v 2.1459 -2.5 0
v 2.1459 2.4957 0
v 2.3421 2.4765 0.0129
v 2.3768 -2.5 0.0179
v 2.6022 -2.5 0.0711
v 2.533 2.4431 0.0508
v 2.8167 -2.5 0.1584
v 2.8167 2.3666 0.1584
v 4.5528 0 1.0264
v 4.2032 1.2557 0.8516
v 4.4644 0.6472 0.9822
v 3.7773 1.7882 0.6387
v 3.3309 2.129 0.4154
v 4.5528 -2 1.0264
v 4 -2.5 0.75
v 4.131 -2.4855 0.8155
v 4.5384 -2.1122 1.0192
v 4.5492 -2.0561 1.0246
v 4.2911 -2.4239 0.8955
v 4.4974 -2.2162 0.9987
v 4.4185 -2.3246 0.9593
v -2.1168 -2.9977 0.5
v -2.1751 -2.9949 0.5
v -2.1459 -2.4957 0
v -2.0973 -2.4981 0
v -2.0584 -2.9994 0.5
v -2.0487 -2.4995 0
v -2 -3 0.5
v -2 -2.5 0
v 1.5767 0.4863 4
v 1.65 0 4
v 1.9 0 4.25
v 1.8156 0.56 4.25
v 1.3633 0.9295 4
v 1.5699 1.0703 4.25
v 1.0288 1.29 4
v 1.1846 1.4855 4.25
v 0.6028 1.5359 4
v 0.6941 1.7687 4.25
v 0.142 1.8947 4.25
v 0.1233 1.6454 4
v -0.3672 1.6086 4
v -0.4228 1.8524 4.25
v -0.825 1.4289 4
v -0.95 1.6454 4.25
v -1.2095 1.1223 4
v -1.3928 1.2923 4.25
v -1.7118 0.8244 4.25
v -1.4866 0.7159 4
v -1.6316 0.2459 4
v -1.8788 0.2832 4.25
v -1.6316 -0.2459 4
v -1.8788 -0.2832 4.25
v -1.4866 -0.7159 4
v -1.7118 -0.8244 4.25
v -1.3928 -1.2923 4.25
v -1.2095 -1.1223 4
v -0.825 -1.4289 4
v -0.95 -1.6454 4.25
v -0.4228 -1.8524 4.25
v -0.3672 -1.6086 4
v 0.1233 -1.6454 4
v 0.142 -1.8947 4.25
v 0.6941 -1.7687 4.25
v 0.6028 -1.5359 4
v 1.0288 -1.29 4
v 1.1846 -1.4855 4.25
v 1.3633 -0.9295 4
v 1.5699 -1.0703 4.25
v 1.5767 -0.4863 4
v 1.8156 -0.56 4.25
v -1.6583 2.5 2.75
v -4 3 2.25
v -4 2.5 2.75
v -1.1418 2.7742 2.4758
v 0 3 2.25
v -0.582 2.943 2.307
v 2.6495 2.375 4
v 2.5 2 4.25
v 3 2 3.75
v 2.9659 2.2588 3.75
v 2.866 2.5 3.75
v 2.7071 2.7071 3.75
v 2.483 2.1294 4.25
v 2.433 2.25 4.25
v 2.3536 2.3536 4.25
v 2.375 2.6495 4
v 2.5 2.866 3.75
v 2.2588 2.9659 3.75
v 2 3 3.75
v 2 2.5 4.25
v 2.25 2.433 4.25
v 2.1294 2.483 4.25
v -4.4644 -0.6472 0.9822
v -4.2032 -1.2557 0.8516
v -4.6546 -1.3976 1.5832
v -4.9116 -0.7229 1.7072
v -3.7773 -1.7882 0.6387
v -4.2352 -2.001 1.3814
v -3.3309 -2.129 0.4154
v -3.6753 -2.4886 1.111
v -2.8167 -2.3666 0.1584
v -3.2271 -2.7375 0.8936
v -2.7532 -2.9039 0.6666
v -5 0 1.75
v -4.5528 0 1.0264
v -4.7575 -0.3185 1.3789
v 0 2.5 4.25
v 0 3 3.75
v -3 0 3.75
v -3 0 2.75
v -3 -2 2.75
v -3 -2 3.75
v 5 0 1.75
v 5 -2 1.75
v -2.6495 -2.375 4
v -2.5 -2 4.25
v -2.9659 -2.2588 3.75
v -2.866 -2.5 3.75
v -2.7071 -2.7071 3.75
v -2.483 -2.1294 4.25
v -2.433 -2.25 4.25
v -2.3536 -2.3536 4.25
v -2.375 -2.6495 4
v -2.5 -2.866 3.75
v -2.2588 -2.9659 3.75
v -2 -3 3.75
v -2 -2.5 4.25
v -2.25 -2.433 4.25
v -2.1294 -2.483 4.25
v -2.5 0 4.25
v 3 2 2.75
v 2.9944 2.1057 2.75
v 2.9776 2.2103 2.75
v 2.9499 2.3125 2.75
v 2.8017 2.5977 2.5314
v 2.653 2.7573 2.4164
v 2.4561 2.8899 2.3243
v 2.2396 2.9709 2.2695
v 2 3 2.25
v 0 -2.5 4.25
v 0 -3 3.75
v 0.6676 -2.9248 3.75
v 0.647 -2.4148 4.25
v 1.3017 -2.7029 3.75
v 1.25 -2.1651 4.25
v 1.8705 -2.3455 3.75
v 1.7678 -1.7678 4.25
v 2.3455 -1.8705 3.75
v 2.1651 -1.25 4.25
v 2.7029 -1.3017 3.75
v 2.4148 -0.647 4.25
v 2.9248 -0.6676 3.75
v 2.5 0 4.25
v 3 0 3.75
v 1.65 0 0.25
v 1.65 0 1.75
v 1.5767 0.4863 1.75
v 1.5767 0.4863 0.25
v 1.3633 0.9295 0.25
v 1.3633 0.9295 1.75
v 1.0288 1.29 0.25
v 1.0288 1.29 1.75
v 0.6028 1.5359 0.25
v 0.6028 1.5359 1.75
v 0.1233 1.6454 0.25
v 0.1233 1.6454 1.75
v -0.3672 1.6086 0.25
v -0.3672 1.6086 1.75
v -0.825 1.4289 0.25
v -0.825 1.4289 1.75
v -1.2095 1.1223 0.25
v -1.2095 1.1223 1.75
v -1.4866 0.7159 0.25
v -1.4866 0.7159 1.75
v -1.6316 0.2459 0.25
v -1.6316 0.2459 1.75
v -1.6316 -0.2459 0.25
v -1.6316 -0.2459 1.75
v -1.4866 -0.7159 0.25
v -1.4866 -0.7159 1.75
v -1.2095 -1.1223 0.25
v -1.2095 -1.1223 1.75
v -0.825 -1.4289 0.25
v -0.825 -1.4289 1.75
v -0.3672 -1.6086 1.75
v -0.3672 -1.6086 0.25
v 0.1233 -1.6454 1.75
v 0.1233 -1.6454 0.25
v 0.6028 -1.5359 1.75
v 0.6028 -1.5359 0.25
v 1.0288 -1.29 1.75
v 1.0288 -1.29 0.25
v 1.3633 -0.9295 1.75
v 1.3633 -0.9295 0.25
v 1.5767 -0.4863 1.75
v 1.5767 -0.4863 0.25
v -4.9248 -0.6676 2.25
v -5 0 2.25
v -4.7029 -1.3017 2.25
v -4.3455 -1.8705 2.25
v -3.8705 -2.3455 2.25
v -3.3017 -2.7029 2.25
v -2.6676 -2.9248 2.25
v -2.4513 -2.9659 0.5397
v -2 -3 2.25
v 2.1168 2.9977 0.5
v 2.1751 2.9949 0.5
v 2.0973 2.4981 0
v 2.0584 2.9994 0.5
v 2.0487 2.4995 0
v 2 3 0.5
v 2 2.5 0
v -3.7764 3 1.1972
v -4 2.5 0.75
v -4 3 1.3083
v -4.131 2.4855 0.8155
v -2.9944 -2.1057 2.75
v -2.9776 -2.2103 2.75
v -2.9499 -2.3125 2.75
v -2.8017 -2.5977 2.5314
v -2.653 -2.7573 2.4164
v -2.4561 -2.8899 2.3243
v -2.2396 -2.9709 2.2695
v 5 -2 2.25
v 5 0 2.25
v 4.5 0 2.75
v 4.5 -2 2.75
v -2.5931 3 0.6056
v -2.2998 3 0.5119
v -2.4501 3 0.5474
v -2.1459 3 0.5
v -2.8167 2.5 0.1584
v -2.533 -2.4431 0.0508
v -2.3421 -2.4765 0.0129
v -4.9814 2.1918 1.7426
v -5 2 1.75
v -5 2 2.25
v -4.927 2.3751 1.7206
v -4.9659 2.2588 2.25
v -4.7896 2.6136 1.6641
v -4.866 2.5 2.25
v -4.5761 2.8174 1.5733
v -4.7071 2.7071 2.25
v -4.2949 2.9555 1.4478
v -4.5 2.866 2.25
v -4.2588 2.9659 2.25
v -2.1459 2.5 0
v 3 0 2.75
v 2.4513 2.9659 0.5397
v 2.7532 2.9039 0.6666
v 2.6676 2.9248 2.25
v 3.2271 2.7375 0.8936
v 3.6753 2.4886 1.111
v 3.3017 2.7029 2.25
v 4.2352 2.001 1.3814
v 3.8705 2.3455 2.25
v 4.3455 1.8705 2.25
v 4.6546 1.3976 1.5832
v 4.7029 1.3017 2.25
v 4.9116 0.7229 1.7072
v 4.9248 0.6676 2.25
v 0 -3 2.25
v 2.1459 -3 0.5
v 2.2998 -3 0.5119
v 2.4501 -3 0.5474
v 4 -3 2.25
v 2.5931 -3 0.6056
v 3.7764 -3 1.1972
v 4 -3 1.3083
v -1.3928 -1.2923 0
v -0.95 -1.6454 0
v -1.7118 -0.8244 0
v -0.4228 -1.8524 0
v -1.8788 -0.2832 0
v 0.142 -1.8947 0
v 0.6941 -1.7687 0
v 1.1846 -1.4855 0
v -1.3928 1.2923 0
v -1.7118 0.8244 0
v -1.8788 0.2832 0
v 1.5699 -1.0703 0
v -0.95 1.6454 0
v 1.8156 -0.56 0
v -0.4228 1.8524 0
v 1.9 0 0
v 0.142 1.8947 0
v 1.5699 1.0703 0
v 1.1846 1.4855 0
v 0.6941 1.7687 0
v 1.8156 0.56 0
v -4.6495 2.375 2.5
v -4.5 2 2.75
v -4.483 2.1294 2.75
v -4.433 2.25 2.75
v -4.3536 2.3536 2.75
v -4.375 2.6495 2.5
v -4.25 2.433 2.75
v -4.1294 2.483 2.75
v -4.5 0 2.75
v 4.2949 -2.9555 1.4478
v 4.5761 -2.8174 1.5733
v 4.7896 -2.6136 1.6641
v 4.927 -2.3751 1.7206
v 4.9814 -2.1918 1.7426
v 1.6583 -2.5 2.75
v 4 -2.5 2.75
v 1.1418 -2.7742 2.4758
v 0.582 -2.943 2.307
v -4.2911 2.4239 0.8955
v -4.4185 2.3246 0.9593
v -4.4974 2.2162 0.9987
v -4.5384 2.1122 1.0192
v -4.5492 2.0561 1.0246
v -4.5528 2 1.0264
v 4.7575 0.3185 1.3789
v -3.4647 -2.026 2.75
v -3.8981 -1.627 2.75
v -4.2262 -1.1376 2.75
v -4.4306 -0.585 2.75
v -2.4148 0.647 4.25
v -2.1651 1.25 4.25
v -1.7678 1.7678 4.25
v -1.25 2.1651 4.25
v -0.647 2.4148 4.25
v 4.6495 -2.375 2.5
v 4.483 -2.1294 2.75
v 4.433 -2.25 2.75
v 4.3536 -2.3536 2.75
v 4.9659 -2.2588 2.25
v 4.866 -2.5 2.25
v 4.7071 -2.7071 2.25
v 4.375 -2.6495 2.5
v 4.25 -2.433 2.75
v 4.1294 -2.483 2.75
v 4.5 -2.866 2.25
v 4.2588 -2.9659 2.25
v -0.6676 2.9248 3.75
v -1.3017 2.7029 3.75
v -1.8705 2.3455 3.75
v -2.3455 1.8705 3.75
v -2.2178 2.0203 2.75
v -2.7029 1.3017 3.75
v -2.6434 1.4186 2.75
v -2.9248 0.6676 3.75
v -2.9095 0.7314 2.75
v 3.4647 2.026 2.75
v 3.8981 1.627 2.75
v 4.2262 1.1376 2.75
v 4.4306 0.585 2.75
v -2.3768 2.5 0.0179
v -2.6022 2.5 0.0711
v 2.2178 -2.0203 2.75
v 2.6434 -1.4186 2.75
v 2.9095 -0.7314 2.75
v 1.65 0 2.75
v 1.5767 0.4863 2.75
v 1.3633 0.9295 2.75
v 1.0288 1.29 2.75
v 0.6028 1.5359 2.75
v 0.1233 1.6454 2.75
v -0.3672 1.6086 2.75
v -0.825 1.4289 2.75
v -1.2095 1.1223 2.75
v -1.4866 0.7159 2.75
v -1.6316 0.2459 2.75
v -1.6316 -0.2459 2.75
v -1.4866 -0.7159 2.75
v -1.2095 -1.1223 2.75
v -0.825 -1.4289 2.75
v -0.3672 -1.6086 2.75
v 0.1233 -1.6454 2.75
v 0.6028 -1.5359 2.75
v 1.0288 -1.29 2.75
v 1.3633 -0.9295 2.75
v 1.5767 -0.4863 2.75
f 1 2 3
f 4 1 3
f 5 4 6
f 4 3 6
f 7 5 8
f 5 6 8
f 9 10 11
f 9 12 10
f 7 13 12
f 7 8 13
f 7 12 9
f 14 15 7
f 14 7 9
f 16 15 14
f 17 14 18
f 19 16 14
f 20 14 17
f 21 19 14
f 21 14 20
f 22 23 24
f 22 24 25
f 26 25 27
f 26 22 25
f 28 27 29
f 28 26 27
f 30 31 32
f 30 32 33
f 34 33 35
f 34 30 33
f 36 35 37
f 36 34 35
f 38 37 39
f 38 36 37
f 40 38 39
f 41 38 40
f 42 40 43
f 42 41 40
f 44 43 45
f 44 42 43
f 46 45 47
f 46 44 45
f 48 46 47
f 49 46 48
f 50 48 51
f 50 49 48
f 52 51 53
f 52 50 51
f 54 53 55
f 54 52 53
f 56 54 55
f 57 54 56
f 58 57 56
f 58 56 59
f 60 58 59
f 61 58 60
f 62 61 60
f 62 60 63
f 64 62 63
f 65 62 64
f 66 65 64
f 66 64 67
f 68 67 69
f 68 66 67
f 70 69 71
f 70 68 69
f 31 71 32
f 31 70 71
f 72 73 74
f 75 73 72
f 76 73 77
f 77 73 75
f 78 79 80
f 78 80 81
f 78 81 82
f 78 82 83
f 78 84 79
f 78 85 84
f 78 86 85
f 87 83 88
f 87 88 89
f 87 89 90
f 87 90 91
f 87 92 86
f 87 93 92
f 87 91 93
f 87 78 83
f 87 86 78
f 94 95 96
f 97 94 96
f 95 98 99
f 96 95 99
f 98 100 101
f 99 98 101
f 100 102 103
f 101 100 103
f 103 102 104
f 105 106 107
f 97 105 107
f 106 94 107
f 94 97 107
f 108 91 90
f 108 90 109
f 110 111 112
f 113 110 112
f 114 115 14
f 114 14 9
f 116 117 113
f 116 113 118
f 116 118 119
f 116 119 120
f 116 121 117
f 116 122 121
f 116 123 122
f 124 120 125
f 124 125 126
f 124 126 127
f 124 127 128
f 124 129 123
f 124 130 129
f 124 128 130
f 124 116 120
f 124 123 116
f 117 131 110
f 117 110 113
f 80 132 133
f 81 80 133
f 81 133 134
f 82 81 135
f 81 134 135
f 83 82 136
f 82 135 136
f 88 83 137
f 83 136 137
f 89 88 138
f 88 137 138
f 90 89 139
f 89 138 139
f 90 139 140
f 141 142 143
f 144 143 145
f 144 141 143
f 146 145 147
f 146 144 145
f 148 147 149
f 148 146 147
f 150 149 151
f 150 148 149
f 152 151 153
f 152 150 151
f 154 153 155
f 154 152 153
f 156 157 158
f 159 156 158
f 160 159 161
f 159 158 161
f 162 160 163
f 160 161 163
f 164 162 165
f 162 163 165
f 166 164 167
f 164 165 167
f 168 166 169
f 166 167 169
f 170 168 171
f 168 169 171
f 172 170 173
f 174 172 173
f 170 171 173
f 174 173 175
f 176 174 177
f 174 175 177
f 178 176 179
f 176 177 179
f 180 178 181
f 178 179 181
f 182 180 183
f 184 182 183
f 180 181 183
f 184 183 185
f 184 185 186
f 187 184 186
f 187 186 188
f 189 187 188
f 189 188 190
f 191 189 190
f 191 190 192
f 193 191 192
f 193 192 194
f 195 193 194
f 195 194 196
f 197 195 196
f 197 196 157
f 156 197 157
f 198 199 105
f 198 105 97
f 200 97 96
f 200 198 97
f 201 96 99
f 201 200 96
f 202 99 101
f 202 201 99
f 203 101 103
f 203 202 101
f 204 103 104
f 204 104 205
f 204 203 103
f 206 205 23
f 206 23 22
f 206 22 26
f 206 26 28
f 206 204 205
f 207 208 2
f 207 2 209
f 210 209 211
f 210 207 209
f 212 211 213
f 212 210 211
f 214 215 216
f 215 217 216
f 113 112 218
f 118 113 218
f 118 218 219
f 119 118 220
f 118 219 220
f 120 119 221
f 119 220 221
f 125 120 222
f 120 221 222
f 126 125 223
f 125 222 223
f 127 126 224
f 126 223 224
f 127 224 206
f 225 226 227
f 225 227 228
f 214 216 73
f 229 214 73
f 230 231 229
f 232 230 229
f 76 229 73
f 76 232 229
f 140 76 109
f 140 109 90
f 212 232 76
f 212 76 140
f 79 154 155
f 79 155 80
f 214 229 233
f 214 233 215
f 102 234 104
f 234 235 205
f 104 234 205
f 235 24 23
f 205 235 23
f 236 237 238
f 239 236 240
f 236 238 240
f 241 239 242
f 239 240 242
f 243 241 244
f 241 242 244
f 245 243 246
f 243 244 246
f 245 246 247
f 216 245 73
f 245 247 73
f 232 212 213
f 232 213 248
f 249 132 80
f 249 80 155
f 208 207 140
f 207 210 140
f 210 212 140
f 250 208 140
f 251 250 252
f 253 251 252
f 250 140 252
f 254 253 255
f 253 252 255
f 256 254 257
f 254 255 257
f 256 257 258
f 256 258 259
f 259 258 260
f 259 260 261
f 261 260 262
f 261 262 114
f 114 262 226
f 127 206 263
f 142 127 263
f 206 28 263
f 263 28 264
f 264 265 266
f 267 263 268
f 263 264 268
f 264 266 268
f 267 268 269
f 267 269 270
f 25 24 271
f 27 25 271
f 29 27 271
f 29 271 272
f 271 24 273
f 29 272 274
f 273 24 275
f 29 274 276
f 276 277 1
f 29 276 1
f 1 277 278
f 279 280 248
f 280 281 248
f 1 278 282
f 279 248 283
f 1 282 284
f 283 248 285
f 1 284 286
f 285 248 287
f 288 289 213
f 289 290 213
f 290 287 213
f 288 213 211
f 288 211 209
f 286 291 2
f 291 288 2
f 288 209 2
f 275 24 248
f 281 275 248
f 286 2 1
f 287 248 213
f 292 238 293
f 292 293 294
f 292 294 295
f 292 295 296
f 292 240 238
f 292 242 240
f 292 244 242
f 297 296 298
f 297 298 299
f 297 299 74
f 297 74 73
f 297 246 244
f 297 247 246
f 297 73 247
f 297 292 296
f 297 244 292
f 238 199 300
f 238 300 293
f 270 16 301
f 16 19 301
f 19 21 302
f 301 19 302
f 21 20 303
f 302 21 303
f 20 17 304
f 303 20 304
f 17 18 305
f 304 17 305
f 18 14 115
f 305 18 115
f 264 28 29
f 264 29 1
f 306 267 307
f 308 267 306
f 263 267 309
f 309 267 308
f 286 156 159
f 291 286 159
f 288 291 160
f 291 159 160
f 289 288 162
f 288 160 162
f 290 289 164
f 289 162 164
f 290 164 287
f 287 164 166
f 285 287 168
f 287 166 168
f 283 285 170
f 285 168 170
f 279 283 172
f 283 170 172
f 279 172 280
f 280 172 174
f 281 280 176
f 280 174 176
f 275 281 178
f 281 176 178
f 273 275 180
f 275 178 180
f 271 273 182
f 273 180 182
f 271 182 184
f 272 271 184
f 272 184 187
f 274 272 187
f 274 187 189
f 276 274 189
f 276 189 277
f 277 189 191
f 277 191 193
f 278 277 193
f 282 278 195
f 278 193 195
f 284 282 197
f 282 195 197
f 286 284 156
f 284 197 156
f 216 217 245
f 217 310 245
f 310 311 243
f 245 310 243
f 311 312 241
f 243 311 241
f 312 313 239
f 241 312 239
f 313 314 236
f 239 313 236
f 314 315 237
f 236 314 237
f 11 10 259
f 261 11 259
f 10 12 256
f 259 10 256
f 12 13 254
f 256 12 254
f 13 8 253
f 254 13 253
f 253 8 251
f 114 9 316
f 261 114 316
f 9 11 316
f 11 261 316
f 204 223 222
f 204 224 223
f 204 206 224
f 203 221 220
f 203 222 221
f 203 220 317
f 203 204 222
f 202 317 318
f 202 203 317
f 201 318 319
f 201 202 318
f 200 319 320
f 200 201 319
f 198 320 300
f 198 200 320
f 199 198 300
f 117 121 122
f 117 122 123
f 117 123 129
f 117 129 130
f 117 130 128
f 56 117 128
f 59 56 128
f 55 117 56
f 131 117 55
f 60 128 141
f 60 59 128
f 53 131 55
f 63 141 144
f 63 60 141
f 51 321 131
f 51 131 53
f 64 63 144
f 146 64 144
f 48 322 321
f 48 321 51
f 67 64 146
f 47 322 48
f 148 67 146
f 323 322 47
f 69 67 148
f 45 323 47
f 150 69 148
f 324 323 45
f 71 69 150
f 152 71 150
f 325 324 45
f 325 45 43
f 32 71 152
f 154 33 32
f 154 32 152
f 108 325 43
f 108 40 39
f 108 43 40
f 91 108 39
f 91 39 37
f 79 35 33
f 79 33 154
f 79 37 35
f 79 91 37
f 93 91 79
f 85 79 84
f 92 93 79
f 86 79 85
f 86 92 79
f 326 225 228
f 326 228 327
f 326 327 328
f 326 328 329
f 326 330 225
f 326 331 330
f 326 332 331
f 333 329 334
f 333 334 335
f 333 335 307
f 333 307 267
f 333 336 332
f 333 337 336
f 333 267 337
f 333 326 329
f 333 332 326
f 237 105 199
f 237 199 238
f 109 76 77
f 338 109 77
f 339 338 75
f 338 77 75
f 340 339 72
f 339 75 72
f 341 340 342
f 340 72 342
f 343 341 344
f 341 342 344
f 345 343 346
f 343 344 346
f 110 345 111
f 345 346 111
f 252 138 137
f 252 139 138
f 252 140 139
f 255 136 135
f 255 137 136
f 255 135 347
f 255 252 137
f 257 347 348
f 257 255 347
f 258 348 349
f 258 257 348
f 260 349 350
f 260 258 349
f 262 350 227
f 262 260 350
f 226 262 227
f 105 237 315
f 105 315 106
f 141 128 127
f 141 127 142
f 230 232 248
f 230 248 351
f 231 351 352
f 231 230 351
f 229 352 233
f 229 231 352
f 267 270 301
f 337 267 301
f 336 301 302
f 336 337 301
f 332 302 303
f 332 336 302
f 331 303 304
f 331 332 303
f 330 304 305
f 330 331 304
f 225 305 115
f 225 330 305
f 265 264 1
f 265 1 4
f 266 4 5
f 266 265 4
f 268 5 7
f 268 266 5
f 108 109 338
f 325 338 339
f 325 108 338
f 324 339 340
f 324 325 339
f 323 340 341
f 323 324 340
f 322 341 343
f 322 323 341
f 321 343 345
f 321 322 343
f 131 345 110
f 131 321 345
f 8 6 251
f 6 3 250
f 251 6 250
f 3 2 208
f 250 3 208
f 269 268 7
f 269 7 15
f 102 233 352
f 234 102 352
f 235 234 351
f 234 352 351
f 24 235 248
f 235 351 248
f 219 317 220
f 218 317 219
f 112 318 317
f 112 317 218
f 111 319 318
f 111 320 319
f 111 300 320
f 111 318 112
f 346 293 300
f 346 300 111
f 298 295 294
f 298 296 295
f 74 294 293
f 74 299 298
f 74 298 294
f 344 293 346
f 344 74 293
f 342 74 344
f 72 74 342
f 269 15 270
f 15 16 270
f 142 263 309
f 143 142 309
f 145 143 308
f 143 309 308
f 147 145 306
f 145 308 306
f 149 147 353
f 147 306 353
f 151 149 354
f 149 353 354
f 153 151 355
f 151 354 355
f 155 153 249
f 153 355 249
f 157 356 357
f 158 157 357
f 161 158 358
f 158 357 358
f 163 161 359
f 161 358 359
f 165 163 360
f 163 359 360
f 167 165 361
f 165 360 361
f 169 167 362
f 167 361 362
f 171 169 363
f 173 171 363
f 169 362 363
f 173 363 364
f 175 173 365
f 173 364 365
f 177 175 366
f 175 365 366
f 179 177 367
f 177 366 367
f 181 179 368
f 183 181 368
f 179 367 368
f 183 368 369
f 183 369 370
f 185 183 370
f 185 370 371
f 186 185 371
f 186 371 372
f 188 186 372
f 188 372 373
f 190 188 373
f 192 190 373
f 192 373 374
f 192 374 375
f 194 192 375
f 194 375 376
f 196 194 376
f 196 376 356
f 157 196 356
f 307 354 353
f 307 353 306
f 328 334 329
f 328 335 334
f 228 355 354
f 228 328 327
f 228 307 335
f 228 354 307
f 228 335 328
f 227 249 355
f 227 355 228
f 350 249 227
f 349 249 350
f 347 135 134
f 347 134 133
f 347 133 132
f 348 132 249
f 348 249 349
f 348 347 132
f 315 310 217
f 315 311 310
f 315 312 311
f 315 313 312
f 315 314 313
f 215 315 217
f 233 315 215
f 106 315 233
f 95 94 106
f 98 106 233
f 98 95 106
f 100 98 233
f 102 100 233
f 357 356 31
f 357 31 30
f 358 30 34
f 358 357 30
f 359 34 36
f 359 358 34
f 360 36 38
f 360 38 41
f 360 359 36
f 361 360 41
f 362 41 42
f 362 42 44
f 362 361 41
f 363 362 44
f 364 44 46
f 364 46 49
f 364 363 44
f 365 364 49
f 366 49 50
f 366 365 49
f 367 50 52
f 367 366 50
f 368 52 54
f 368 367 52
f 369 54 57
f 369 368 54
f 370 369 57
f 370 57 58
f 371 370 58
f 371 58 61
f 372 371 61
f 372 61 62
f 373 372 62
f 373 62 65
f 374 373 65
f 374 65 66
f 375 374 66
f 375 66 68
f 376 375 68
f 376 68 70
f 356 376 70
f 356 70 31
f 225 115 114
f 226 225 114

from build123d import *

# Parameters (mm, degrees)
SKETCH_W        = 10
SKETCH_H        = 6
PAD_DEPTH       = 2.75
SKETCH001_R     = 1.65
HOLE_DEPTH      = 25
FILLET_R        = 3
FILLET001_R     = 1
POCKET_DEPTH    = 6.001
FILLET002_R     = 1.5
CHAMFER_SIZE    = 0.5
SKETCH002_R     = 1.65
PAD001_DEPTH    = 2.5
CHAMFER001_SIZE = 0.5
CHAMFER002_SIZE = 0.25


with BuildPart() as part:
    # Sketch → Pad (new body)
    with BuildSketch(Plane.XY):
        Rectangle(SKETCH_W, SKETCH_H)
    extrude(amount=PAD_DEPTH)

    # Sketch001 (on Face6 of Pad) → Hole (cut)
    with BuildSketch(Plane.XY.offset(2.75)):
        Circle(SKETCH001_R)
    extrude(amount=-HOLE_DEPTH, mode=Mode.SUBTRACT)

    # Fillet
    fillet_edges = [part.edges().sort_by_distance(p)[0] for p in [
        (-5, -3, 1.375),
        (5, 3, 1.375),
    ]]
    fillet(fillet_edges, radius=FILLET_R)

    # Fillet001
    fillet001_edges = [part.edges().sort_by_distance(p)[0] for p in [
        (-5, 3, 1.375),
        (5, -3, 1.375),
    ]]
    fillet(fillet001_edges, radius=FILLET001_R)

    # Sketch003 → Pocket (cut, through all)
    with BuildSketch(Plane.XZ.offset(3)):
        Polygon((-5, 1.25), (-2.5, 0), (-5, 0), align=None)
        Polygon((5, 1.25), (5, 0), (2.5, 0), align=None)
    extrude(amount=-POCKET_DEPTH, mode=Mode.SUBTRACT)

    # Fillet002
    fillet002_edges = [part.edges().sort_by_distance(p)[0] for p in [
        (-2.5, 0.02098, 0),
        (2.5, -0.02098, 0),
    ]]
    fillet(fillet002_edges, radius=FILLET002_R)

    # Chamfer
    chamfer_edges = [part.edges().sort_by_distance(p)[0] for p in [
        (-1, 3, 2.75),
        (0.072949, -3, 0),
    ]]
    chamfer(chamfer_edges, length=CHAMFER_SIZE)

    # Sketch002 (on Face5 of Hole) → Pad001 (join)
    with BuildSketch(Plane.XY.offset(1.75)):
        with BuildLine():
            ThreePointArc((0, 3), (-2.12132, 2.12132), (-3, 0))
            Line((-3, 0), (-3, -2))
            ThreePointArc((-3, -2), (-2.707107, -2.707107), (-2, -3))
            Line((-2, -3), (0, -3))
            ThreePointArc((0, -3), (2.12132, -2.12132), (3, 0))
            Line((3, 2), (3, 0))
            ThreePointArc((3, 2), (2.707107, 2.707107), (2, 3))
            Line((0, 3), (2, 3))
        make_face()
        Circle(SKETCH002_R, mode=Mode.SUBTRACT)
    extrude(amount=PAD001_DEPTH)

    # Chamfer001
    chamfer001_edges = [part.edges().sort_by_distance(p)[0] for p in [
        (-1, -3, 4.25),
    ]]
    chamfer(chamfer001_edges, length=CHAMFER001_SIZE)

    # Chamfer002
    chamfer002_edges = [part.edges().sort_by_distance(p)[0] for p in [
        (-1.65, 0, 0),
        (1.65, 0, 2.125),
        (-1.65, 0, 4.25),
    ]]
    chamfer(chamfer002_edges, length=CHAMFER002_SIZE)


solid = part.part
